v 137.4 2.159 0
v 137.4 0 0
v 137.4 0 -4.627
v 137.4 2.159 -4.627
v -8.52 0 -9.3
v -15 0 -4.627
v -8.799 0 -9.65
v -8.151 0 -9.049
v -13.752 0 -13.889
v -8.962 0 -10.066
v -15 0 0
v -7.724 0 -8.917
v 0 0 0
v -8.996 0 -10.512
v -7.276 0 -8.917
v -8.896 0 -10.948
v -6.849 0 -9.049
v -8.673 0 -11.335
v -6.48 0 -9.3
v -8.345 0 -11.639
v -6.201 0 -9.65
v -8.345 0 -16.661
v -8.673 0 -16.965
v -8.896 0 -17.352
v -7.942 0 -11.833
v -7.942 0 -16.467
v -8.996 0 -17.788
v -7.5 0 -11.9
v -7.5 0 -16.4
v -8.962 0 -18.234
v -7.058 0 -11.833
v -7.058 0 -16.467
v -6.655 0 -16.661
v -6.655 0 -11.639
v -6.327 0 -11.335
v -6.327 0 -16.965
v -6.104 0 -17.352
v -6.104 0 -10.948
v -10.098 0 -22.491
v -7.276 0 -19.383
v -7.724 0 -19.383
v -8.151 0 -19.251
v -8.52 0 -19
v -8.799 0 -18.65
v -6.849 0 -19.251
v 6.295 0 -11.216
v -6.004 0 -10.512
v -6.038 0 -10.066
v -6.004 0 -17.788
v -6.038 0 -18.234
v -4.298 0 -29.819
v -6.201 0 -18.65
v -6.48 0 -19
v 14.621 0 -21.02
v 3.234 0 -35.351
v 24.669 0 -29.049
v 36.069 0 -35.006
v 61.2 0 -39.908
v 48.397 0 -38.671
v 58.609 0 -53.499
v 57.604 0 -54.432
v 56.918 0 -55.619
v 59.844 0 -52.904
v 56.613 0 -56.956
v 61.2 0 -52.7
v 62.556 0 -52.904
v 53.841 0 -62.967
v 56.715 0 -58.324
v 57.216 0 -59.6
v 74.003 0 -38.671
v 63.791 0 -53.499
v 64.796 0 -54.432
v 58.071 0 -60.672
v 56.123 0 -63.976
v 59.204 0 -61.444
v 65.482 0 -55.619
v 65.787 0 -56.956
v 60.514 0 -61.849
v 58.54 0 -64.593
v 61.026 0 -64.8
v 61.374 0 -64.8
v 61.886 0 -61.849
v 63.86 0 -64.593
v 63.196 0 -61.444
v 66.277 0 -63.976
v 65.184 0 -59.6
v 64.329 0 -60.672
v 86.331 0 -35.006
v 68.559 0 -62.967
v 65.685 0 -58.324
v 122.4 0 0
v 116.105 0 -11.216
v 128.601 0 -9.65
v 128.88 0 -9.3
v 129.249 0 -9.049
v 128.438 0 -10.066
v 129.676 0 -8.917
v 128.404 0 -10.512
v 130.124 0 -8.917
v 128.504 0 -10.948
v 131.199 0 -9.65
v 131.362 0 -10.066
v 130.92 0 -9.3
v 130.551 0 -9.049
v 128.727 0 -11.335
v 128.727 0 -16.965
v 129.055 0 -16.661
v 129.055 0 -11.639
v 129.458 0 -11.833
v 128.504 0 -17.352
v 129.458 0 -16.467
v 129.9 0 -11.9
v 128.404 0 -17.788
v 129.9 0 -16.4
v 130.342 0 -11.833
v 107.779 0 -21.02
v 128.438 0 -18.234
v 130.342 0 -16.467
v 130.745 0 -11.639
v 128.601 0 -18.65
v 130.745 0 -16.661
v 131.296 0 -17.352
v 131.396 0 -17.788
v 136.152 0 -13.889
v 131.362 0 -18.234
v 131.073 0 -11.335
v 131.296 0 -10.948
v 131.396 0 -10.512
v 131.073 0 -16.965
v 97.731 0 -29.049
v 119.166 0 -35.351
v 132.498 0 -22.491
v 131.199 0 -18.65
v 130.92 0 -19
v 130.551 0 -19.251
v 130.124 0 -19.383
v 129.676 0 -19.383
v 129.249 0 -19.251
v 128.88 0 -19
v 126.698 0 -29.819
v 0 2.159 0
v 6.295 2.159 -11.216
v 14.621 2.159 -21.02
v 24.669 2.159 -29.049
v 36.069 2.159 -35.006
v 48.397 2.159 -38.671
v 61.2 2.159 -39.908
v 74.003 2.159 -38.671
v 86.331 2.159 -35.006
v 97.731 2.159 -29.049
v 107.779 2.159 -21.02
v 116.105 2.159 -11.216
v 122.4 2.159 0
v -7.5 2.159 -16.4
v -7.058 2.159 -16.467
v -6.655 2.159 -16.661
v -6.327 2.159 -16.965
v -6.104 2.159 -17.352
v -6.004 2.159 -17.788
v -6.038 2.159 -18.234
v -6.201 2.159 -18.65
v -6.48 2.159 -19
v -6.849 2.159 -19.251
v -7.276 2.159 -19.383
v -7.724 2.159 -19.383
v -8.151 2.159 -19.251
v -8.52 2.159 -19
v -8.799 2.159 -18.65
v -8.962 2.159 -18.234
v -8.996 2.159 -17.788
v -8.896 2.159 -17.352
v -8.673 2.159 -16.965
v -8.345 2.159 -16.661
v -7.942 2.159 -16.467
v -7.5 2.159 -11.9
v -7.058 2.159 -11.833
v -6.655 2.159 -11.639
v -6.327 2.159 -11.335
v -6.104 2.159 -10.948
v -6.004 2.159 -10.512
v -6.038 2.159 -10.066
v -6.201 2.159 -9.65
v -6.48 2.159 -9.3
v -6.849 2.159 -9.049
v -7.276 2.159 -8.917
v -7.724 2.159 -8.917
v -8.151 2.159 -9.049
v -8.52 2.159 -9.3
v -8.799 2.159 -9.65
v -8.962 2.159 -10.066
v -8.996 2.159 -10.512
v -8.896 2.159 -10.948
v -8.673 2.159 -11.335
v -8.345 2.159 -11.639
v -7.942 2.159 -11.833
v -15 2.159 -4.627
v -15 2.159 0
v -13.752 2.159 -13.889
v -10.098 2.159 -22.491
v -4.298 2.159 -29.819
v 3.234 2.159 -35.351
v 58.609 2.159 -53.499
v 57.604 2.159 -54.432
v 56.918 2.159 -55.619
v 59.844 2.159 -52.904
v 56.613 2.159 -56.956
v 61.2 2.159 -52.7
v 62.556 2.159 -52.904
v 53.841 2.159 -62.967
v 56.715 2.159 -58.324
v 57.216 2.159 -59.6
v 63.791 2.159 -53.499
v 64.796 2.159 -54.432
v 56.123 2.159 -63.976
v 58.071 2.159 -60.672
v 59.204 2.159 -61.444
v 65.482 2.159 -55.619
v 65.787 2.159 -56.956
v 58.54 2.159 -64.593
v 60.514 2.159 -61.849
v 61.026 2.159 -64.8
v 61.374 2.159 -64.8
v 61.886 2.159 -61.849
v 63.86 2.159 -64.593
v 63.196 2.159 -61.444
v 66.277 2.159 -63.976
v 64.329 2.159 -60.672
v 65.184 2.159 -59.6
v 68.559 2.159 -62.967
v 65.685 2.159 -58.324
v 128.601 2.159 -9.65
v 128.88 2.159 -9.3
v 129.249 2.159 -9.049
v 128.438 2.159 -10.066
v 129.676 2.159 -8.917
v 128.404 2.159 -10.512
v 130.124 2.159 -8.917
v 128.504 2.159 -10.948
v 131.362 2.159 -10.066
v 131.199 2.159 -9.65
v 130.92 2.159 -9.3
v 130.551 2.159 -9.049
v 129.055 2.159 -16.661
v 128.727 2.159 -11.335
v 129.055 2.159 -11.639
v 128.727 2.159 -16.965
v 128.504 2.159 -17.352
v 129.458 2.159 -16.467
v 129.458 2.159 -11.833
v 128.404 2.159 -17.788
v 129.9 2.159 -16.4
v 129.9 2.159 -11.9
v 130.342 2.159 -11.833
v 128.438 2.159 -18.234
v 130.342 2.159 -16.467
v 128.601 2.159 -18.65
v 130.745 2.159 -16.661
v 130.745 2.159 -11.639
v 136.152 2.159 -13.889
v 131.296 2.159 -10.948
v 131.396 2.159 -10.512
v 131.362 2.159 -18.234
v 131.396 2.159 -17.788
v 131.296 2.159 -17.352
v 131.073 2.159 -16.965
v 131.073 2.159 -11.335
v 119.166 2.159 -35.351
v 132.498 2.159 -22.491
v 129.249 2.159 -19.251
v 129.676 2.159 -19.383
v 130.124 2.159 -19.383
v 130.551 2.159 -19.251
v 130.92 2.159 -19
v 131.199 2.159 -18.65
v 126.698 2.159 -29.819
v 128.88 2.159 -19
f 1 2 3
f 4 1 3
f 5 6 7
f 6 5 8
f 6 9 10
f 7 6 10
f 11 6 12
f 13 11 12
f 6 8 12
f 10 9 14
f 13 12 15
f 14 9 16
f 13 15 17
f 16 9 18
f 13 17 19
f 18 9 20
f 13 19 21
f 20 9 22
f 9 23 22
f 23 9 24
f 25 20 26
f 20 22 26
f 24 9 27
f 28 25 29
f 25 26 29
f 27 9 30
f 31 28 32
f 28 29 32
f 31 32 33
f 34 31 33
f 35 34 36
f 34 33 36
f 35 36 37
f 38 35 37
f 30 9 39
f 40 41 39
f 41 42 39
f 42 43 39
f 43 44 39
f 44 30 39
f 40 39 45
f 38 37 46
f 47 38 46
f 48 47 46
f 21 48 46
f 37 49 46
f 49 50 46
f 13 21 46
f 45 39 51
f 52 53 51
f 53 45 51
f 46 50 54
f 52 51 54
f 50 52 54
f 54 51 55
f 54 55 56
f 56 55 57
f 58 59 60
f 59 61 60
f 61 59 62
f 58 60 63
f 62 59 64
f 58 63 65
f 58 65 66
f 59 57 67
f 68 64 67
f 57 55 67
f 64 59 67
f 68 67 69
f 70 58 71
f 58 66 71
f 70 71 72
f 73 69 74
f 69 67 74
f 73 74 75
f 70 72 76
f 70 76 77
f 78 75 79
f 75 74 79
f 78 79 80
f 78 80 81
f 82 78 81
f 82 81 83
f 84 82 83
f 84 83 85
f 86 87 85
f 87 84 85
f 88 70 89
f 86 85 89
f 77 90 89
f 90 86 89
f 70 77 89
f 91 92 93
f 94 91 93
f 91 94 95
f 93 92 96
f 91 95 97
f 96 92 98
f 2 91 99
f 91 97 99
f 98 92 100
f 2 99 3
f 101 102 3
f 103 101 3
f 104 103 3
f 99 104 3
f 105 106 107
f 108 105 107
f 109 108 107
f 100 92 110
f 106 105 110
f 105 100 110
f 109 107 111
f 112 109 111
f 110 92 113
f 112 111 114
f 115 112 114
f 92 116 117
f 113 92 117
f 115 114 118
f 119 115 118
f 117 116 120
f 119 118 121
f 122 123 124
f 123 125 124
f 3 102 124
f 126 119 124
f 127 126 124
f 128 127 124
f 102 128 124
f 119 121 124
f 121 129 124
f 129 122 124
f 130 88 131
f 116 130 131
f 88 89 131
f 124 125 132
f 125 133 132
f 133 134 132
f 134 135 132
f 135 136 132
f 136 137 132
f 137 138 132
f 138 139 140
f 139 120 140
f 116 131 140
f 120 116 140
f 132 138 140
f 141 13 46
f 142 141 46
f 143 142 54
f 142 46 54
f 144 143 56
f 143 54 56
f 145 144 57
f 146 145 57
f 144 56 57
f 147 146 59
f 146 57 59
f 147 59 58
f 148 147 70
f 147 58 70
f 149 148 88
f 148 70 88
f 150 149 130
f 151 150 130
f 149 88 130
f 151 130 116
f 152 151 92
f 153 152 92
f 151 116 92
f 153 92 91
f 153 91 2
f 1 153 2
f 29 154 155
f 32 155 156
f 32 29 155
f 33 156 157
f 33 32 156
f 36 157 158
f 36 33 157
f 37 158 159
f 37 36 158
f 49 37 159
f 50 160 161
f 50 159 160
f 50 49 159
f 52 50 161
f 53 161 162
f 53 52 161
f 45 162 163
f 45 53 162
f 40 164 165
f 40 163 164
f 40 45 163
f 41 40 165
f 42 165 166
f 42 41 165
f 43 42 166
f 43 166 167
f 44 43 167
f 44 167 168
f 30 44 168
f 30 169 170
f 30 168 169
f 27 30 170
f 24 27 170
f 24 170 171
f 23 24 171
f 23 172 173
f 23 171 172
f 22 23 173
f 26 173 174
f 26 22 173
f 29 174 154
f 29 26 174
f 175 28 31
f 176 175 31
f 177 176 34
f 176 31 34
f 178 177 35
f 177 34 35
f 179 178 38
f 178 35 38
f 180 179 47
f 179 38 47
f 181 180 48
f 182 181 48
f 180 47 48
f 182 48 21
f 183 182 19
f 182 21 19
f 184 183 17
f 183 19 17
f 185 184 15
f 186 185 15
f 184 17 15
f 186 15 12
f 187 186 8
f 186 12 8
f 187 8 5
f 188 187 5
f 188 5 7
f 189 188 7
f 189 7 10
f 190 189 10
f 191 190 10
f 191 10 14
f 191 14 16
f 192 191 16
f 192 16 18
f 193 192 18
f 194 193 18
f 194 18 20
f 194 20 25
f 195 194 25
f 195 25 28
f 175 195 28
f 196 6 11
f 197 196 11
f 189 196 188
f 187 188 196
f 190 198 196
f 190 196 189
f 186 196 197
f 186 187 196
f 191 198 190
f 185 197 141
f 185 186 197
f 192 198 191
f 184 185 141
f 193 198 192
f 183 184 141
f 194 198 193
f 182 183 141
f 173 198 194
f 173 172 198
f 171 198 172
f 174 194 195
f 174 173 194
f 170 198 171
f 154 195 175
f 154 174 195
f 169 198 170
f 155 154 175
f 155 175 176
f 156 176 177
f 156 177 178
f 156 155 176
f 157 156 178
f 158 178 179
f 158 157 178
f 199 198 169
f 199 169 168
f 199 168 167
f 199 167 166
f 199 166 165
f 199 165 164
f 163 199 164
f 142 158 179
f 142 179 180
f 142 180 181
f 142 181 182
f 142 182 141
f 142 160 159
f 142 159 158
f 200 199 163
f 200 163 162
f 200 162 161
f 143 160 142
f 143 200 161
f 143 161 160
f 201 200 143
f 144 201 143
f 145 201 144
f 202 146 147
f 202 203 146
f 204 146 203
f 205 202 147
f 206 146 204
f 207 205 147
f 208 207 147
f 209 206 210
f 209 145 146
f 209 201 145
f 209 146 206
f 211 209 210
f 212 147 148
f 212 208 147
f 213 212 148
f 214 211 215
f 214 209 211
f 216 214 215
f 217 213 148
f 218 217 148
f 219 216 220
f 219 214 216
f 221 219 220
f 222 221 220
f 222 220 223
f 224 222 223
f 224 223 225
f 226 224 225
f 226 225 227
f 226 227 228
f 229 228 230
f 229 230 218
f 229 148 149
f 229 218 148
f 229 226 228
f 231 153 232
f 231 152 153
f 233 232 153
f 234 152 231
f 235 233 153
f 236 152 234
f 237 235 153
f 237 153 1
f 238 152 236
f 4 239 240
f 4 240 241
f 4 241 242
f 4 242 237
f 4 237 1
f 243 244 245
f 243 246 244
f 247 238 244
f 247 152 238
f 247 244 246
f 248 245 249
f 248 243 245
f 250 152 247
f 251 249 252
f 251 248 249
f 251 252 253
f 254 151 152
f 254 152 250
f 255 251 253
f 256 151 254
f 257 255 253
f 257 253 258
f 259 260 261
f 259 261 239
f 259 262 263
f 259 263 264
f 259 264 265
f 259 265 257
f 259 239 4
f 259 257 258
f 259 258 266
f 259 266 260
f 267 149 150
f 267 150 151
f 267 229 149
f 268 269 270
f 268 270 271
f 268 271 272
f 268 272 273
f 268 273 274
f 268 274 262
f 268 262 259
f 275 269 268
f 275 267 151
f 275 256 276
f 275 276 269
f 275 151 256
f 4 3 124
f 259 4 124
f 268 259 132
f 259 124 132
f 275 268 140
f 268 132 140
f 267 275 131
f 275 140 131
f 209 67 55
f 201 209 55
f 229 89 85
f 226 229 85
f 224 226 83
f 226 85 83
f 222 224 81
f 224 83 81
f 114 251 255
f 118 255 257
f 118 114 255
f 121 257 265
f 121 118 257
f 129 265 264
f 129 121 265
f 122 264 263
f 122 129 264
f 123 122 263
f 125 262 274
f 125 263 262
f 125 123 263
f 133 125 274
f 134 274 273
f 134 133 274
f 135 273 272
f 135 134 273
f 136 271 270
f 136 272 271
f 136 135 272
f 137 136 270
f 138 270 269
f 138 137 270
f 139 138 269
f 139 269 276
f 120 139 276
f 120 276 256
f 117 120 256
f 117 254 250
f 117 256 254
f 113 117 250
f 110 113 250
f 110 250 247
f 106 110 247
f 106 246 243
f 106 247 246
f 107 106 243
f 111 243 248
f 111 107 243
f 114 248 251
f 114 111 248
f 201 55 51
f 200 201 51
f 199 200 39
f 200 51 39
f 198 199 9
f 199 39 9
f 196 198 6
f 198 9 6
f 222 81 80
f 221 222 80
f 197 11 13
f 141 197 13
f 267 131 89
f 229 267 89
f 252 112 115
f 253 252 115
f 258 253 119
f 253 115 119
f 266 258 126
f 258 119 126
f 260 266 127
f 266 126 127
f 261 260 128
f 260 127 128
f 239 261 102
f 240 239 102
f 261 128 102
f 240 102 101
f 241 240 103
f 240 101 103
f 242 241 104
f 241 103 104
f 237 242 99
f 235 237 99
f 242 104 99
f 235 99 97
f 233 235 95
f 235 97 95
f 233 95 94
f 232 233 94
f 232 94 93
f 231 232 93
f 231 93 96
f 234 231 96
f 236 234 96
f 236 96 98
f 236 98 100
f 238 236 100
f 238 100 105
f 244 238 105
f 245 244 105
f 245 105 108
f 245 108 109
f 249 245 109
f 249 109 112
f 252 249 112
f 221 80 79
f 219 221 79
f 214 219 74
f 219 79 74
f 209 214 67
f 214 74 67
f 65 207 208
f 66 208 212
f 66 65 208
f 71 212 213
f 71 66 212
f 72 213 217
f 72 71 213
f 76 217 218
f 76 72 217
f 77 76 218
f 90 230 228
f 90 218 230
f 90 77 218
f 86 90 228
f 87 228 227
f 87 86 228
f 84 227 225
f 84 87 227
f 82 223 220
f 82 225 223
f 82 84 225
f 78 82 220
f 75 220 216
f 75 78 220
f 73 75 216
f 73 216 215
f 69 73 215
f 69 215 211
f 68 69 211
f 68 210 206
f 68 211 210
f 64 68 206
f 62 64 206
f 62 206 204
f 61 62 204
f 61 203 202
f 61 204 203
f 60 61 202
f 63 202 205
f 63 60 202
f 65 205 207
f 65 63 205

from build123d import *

# Parameters (mm, degrees)
SKETCH1_R           = 4.6
SKETCH1_R_2         = 1.5
BOSS_EXTRUDE2_DEPTH = 3.175
SKETCH2_W           = 235.965281387
SKETCH2_H           = 118.721671229
CUT_EXTRUDE1_DEPTH  = 1.016


with BuildPart() as part:
    # Sketch1 → Boss-Extrude2 (new body)
    with BuildSketch(Plane(origin=(0, 0, 0), x_dir=(1, 0, 0), z_dir=(0, 1, 0))):
        with BuildLine():
            Line((-7.5, 0), (0, 0))
            ThreePointArc((0, 0), (61.2, 39.907584028), (122.4, 0))
            Line((122.4, 0), (129.9, 0))
            Line((129.9, 0), (137.4, 0))
            Line((137.4, 0), (137.4, 4.627434139))
            ThreePointArc((137.4, 4.627434139), (132.49819386, 22.490768832), (119.165787065, 35.350526172))
            Line((119.165787065, 35.350526172), (68.55887696, 62.967039443))
            ThreePointArc((68.55887696, 62.967039443), (65.081261882, 64.334538033), (61.373539646, 64.8))
            Line((61.373539646, 64.8), (61.026460354, 64.8))
            ThreePointArc((61.026460354, 64.8), (57.318738118, 64.334538033), (53.84112304, 62.967039443))
            Line((53.84112304, 62.967039443), (3.234212935, 35.350526172))
            ThreePointArc((3.234212935, 35.350526172), (-10.09819386, 22.490768832), (-15, 4.627434139))
            Line((-15, 4.627434139), (-15, 0))
            Line((-15, 0), (-7.5, 0))
        make_face()
        with Locations(Location((61.2, 57.3, 0), (0, 0, 270))):
            Circle(SKETCH1_R, mode=Mode.SUBTRACT)
        with BuildLine():
            ThreePointArc((-7.5, 8.9), (-9, 10.4), (-7.5, 11.9))
            ThreePointArc((-7.5, 11.9), (-6, 10.4), (-7.5, 8.9))
        make_face(mode=Mode.SUBTRACT)
        with Locations(Location((-7.5, 17.9, 0), (0, 0, 270))):
            Circle(SKETCH1_R_2, mode=Mode.SUBTRACT)
        with BuildLine():
            ThreePointArc((129.9, 8.9), (128.4, 10.4), (129.9, 11.9))
            ThreePointArc((129.9, 11.9), (131.4, 10.4), (129.9, 8.9))
        make_face(mode=Mode.SUBTRACT)
        with Locations(Location((129.9, 17.9, 0), (0, 0, 270))):
            Circle(SKETCH1_R_2, mode=Mode.SUBTRACT)
    extrude(amount=BOSS_EXTRUDE2_DEPTH)

    # Sketch2 → Cut-Extrude1 (cut)
    with BuildSketch(Plane(origin=(0, 3.175, 0), x_dir=(1, 0, 0), z_dir=(0, 1, 0))):
        with Locations((50.311488443, 30.817995662)):
            Rectangle(SKETCH2_W, SKETCH2_H)
    extrude(amount=-CUT_EXTRUDE1_DEPTH, mode=Mode.SUBTRACT)


solid = part.part
